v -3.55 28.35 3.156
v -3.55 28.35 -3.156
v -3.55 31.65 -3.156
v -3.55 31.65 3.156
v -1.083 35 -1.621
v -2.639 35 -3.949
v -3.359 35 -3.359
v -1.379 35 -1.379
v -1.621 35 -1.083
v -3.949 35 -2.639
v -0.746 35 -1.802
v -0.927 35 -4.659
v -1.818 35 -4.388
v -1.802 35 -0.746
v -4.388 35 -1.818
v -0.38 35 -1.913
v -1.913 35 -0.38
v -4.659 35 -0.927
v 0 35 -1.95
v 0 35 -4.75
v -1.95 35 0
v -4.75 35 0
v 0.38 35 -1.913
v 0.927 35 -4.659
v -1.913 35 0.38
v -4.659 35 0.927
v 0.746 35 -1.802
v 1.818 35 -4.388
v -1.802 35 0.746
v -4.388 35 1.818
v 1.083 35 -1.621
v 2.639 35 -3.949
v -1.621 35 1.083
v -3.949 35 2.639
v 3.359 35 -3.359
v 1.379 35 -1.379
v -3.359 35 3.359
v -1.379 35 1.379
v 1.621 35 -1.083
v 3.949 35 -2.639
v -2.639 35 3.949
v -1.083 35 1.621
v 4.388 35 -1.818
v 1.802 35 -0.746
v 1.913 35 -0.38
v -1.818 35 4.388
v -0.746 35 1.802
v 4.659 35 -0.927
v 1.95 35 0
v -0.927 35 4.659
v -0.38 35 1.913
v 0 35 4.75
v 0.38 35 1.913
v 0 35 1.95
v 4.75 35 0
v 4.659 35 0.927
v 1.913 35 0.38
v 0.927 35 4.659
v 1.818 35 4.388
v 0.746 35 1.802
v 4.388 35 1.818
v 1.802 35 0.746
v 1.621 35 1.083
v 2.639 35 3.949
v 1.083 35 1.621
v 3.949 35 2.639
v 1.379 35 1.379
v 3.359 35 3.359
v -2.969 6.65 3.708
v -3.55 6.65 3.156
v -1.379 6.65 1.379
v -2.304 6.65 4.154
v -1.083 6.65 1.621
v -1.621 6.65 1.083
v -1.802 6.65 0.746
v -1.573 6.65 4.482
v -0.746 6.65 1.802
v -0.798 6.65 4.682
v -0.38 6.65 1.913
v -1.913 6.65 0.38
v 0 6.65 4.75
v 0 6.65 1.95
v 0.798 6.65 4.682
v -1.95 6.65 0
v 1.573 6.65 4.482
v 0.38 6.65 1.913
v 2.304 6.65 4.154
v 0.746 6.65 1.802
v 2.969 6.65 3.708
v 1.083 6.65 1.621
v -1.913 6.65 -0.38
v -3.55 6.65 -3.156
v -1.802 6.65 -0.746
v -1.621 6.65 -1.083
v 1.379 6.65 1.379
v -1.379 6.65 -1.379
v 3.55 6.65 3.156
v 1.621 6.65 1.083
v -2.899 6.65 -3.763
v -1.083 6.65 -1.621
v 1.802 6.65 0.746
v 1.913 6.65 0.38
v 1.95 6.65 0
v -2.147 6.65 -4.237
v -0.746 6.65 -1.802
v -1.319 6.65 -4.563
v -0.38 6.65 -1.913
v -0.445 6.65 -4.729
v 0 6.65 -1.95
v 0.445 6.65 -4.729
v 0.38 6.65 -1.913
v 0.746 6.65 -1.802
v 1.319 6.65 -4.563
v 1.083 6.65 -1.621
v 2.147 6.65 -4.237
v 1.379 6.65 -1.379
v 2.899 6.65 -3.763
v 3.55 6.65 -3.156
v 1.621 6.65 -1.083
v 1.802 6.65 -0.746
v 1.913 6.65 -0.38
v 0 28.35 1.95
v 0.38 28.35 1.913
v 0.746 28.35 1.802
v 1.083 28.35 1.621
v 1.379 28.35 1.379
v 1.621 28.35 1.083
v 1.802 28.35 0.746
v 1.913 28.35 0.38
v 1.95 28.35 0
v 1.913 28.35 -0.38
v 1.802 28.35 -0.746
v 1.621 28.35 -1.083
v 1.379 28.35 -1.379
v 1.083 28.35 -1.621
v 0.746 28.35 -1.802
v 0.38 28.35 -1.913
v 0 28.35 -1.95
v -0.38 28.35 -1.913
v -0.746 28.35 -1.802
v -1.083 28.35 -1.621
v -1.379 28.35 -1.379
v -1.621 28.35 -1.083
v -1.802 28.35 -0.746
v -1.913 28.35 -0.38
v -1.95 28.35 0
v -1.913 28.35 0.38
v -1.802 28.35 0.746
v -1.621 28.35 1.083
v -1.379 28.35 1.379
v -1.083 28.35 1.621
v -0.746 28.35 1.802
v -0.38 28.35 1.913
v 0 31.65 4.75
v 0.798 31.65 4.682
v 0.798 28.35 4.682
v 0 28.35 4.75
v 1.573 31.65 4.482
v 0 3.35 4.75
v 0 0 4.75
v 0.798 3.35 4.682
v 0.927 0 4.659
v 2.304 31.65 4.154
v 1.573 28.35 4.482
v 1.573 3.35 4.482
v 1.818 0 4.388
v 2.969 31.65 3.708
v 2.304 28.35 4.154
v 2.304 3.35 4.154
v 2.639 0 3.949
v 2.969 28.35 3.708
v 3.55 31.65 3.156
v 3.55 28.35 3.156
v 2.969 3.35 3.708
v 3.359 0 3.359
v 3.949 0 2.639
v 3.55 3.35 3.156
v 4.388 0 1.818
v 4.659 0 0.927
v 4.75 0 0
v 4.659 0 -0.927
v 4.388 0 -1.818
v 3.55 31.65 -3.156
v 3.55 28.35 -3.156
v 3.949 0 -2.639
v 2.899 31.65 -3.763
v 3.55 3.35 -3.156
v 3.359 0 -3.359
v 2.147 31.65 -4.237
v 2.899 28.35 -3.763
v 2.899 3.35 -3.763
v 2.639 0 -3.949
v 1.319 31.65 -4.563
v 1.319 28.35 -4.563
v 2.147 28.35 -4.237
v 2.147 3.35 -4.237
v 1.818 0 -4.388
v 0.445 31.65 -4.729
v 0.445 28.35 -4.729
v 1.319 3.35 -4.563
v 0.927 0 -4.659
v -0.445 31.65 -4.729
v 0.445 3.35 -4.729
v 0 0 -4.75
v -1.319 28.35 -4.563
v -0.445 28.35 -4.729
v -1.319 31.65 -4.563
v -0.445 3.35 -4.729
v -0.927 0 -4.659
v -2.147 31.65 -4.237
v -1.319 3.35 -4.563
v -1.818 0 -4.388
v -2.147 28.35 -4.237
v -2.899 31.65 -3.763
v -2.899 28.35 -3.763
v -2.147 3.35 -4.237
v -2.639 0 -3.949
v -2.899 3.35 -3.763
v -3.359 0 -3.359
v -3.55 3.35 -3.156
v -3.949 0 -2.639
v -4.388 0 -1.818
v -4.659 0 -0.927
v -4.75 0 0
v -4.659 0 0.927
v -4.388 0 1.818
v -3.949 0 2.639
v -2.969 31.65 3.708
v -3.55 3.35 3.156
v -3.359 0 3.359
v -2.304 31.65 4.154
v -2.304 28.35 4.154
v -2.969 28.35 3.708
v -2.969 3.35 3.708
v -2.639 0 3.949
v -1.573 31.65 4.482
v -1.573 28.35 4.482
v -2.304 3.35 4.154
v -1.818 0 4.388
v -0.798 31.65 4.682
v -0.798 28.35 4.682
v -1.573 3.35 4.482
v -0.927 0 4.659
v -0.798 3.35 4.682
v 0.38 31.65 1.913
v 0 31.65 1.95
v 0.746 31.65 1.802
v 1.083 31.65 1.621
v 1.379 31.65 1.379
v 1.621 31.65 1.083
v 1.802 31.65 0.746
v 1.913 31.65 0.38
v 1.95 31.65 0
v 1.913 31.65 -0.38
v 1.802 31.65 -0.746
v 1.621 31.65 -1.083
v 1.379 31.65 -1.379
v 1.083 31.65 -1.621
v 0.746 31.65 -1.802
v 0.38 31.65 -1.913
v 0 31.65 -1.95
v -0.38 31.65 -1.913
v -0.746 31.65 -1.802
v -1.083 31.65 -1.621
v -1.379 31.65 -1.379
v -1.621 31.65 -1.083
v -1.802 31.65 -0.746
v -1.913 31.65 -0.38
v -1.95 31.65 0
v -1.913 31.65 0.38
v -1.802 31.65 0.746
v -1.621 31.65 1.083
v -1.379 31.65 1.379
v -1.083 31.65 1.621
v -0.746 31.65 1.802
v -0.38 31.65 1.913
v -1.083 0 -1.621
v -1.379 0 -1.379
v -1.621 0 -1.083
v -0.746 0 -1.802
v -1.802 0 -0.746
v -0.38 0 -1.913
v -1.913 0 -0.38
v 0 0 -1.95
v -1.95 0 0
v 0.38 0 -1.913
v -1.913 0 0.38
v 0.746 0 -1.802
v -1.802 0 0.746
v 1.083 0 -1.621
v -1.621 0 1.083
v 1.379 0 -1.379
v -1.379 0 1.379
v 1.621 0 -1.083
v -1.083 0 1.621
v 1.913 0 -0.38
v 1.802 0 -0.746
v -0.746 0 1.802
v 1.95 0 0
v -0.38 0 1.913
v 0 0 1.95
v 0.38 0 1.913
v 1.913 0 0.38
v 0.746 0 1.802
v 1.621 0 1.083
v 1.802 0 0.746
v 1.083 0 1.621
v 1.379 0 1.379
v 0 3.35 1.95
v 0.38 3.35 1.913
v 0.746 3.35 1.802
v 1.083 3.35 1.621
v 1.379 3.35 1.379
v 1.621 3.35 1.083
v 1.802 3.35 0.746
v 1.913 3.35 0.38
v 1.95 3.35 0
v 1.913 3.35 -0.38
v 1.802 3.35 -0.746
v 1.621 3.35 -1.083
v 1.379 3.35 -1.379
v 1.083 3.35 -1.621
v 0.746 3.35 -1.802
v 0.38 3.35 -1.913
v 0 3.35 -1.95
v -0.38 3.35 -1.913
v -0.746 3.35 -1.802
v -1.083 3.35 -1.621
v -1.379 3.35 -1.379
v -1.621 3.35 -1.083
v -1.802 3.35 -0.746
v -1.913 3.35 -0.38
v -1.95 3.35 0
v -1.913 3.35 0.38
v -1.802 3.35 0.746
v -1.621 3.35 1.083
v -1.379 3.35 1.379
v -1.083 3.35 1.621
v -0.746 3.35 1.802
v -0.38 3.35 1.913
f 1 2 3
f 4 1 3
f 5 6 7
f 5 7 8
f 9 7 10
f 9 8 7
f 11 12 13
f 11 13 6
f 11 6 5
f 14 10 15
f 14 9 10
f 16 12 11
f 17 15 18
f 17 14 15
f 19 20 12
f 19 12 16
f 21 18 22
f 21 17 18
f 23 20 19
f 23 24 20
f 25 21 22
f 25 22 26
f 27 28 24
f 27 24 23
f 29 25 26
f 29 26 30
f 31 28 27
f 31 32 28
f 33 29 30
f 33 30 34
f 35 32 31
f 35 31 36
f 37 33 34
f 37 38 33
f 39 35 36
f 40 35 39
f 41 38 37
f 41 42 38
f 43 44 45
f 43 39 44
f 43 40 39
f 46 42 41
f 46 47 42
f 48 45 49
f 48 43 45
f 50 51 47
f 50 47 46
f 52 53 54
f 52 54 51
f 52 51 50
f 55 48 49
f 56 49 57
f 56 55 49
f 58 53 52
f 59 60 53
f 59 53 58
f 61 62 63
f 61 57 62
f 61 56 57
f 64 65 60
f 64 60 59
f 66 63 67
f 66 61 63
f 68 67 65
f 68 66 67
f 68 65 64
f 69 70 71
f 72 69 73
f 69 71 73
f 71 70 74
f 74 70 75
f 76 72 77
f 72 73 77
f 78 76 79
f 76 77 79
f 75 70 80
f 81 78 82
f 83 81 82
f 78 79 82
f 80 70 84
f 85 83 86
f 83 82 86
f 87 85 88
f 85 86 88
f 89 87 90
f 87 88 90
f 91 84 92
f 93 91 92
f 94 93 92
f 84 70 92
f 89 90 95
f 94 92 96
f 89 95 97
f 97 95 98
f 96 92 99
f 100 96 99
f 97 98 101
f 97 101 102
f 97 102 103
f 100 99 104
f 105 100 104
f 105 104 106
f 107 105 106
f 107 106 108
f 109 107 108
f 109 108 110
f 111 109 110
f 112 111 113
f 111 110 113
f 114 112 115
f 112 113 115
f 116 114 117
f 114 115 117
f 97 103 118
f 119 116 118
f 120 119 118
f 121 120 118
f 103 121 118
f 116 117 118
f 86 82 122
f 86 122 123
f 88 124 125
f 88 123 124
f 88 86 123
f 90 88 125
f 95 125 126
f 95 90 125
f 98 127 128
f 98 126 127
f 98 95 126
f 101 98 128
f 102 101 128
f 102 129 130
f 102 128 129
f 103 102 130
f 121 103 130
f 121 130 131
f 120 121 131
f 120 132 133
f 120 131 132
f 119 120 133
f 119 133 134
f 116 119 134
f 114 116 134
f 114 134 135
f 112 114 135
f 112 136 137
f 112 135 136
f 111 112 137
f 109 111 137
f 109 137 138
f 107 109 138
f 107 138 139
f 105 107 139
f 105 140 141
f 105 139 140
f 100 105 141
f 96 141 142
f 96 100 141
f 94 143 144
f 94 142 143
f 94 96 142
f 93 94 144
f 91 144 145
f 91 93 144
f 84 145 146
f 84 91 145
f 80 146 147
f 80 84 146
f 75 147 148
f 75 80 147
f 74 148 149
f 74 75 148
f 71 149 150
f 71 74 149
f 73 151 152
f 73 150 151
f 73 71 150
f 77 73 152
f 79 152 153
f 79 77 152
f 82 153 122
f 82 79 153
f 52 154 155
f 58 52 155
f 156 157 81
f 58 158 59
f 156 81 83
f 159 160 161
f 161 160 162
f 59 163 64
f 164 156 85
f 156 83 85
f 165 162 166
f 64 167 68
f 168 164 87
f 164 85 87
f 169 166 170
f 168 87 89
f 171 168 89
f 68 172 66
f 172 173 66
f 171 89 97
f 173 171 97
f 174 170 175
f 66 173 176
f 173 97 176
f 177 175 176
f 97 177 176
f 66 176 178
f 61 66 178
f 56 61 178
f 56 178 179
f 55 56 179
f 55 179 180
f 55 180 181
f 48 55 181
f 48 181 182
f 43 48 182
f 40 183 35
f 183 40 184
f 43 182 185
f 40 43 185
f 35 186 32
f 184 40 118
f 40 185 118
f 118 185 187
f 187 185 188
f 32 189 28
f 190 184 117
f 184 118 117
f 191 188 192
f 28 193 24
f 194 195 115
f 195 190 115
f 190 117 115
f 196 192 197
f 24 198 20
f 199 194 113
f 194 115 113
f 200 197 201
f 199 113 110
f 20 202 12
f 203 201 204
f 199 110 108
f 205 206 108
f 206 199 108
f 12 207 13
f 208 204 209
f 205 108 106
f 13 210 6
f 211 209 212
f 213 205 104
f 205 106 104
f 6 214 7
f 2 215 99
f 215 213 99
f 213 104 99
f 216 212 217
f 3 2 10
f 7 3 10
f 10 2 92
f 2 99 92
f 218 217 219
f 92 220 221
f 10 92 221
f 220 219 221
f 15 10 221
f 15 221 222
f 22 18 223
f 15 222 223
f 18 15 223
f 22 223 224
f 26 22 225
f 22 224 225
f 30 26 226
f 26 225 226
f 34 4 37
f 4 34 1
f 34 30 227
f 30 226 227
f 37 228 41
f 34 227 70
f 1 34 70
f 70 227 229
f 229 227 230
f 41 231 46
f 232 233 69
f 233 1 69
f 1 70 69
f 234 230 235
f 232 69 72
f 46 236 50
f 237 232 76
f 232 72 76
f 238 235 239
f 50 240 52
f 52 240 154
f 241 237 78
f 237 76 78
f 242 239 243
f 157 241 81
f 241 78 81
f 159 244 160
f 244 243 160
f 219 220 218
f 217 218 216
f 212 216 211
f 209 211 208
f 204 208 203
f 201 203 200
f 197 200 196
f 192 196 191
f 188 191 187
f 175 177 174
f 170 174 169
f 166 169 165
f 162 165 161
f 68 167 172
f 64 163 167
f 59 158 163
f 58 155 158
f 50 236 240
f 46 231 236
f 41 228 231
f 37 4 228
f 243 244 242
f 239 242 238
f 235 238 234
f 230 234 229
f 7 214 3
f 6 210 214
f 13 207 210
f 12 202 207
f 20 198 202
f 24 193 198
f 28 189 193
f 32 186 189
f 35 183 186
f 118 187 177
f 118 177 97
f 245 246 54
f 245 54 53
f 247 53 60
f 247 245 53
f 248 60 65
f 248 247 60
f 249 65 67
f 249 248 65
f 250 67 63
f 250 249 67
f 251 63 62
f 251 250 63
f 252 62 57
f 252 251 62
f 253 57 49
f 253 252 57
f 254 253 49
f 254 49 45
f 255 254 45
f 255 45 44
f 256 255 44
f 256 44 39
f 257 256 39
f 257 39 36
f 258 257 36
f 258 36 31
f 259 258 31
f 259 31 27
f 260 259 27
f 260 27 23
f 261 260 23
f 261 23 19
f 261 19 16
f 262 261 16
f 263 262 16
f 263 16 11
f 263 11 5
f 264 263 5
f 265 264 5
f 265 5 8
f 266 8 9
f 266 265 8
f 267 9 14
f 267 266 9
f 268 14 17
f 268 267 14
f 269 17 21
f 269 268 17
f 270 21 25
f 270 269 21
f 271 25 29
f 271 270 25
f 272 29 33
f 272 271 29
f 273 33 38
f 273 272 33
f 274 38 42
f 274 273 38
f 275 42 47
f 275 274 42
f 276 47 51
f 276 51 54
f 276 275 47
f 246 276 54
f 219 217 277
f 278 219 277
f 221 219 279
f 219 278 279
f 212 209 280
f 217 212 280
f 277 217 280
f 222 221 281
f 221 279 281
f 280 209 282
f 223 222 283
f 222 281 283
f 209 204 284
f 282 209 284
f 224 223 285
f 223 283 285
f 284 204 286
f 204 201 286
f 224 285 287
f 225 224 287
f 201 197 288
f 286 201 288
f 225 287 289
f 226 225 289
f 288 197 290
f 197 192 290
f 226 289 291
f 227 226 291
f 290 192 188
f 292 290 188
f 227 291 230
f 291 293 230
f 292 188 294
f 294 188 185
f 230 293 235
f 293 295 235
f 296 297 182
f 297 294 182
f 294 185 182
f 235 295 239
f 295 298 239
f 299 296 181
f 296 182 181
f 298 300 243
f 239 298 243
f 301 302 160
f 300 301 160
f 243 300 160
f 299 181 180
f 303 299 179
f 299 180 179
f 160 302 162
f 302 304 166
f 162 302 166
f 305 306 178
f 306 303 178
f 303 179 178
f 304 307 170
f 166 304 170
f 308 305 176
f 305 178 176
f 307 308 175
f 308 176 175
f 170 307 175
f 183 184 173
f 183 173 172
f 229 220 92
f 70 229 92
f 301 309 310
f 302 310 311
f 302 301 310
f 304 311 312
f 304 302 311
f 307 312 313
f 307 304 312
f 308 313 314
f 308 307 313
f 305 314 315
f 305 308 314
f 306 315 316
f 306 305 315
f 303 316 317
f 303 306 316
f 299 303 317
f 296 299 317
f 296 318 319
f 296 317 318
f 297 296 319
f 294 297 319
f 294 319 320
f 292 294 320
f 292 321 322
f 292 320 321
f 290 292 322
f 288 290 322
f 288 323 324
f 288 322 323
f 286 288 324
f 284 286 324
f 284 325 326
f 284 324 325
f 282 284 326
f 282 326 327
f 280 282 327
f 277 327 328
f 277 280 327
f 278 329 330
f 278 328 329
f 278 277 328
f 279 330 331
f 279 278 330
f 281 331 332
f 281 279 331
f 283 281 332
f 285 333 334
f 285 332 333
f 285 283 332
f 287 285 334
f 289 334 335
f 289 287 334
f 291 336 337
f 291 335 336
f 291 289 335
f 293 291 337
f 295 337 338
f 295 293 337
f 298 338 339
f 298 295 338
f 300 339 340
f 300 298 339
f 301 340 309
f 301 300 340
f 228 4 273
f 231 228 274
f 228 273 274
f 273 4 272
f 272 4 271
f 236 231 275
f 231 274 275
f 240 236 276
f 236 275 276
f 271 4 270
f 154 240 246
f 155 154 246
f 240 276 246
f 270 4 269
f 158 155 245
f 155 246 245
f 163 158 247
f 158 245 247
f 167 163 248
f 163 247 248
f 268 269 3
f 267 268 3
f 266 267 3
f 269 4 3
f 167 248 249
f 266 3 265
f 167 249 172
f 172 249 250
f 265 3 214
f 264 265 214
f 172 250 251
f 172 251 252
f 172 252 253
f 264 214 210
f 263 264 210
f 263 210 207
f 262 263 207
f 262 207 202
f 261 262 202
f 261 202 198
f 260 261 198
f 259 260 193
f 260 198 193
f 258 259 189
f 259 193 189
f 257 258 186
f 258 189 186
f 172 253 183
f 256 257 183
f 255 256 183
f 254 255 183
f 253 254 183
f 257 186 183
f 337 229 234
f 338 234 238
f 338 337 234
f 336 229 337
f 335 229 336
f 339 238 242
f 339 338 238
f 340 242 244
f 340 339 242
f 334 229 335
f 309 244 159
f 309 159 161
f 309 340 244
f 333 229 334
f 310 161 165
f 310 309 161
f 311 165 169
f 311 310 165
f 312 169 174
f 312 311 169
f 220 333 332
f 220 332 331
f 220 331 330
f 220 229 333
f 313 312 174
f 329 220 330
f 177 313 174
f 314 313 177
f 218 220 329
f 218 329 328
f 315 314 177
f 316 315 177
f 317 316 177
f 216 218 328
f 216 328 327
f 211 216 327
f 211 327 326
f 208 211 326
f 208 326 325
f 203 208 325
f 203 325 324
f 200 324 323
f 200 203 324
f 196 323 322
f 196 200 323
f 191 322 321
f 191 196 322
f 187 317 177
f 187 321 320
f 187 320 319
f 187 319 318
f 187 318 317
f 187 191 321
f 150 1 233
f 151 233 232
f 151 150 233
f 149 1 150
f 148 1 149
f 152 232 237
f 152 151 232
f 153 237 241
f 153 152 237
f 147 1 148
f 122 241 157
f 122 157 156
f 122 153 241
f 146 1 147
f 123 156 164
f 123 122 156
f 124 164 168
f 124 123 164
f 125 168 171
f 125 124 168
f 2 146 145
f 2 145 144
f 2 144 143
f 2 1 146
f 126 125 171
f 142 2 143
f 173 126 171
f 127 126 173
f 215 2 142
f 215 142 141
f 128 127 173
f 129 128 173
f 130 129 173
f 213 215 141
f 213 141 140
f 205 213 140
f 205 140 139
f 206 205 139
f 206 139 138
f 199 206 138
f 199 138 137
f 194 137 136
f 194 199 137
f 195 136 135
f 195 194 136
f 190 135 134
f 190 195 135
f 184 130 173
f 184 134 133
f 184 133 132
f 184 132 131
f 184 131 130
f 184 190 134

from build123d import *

# Parameters (mm, degrees)
SKETCH1_R               = 4.75
SKETCH1_R_2             = 1.95
BOSS_EXTRUDE1_DEPTH     = 35
CUT_EXTRUDE1_DEPTH      = 36.638813112
CUT_EXTRUDE1_DEPTH_BACK = 36.638813112
SKETCH2_W               = 7.1
SKETCH2_H               = 3.3


with BuildPart() as part:
    # Sketch1 → Boss-Extrude1 (new body)
    with BuildSketch(Plane(origin=(0, 0, 0), x_dir=(1, 0, 0), z_dir=(0, 1, 0))):
        with Locations(Location((0, 0, 0), (0, 0, 270))):
            Circle(SKETCH1_R)
        with Locations(Location((0, 0, 0), (0, 0, 270))):
            Circle(SKETCH1_R_2, mode=Mode.SUBTRACT)
    extrude(amount=BOSS_EXTRUDE1_DEPTH)

    # Sketch2 → Cut-Extrude1 (cut, two sides: drawn at the far end of the back side and taken through both)
    with BuildSketch(Plane.XY.offset(-CUT_EXTRUDE1_DEPTH_BACK)):
        with Locations((0, 30)):
            Rectangle(SKETCH2_W, SKETCH2_H)
        with Locations((0, 5)):
            Rectangle(SKETCH2_W, SKETCH2_H)
    extrude(amount=CUT_EXTRUDE1_DEPTH + CUT_EXTRUDE1_DEPTH_BACK, mode=Mode.SUBTRACT)


solid = part.part
